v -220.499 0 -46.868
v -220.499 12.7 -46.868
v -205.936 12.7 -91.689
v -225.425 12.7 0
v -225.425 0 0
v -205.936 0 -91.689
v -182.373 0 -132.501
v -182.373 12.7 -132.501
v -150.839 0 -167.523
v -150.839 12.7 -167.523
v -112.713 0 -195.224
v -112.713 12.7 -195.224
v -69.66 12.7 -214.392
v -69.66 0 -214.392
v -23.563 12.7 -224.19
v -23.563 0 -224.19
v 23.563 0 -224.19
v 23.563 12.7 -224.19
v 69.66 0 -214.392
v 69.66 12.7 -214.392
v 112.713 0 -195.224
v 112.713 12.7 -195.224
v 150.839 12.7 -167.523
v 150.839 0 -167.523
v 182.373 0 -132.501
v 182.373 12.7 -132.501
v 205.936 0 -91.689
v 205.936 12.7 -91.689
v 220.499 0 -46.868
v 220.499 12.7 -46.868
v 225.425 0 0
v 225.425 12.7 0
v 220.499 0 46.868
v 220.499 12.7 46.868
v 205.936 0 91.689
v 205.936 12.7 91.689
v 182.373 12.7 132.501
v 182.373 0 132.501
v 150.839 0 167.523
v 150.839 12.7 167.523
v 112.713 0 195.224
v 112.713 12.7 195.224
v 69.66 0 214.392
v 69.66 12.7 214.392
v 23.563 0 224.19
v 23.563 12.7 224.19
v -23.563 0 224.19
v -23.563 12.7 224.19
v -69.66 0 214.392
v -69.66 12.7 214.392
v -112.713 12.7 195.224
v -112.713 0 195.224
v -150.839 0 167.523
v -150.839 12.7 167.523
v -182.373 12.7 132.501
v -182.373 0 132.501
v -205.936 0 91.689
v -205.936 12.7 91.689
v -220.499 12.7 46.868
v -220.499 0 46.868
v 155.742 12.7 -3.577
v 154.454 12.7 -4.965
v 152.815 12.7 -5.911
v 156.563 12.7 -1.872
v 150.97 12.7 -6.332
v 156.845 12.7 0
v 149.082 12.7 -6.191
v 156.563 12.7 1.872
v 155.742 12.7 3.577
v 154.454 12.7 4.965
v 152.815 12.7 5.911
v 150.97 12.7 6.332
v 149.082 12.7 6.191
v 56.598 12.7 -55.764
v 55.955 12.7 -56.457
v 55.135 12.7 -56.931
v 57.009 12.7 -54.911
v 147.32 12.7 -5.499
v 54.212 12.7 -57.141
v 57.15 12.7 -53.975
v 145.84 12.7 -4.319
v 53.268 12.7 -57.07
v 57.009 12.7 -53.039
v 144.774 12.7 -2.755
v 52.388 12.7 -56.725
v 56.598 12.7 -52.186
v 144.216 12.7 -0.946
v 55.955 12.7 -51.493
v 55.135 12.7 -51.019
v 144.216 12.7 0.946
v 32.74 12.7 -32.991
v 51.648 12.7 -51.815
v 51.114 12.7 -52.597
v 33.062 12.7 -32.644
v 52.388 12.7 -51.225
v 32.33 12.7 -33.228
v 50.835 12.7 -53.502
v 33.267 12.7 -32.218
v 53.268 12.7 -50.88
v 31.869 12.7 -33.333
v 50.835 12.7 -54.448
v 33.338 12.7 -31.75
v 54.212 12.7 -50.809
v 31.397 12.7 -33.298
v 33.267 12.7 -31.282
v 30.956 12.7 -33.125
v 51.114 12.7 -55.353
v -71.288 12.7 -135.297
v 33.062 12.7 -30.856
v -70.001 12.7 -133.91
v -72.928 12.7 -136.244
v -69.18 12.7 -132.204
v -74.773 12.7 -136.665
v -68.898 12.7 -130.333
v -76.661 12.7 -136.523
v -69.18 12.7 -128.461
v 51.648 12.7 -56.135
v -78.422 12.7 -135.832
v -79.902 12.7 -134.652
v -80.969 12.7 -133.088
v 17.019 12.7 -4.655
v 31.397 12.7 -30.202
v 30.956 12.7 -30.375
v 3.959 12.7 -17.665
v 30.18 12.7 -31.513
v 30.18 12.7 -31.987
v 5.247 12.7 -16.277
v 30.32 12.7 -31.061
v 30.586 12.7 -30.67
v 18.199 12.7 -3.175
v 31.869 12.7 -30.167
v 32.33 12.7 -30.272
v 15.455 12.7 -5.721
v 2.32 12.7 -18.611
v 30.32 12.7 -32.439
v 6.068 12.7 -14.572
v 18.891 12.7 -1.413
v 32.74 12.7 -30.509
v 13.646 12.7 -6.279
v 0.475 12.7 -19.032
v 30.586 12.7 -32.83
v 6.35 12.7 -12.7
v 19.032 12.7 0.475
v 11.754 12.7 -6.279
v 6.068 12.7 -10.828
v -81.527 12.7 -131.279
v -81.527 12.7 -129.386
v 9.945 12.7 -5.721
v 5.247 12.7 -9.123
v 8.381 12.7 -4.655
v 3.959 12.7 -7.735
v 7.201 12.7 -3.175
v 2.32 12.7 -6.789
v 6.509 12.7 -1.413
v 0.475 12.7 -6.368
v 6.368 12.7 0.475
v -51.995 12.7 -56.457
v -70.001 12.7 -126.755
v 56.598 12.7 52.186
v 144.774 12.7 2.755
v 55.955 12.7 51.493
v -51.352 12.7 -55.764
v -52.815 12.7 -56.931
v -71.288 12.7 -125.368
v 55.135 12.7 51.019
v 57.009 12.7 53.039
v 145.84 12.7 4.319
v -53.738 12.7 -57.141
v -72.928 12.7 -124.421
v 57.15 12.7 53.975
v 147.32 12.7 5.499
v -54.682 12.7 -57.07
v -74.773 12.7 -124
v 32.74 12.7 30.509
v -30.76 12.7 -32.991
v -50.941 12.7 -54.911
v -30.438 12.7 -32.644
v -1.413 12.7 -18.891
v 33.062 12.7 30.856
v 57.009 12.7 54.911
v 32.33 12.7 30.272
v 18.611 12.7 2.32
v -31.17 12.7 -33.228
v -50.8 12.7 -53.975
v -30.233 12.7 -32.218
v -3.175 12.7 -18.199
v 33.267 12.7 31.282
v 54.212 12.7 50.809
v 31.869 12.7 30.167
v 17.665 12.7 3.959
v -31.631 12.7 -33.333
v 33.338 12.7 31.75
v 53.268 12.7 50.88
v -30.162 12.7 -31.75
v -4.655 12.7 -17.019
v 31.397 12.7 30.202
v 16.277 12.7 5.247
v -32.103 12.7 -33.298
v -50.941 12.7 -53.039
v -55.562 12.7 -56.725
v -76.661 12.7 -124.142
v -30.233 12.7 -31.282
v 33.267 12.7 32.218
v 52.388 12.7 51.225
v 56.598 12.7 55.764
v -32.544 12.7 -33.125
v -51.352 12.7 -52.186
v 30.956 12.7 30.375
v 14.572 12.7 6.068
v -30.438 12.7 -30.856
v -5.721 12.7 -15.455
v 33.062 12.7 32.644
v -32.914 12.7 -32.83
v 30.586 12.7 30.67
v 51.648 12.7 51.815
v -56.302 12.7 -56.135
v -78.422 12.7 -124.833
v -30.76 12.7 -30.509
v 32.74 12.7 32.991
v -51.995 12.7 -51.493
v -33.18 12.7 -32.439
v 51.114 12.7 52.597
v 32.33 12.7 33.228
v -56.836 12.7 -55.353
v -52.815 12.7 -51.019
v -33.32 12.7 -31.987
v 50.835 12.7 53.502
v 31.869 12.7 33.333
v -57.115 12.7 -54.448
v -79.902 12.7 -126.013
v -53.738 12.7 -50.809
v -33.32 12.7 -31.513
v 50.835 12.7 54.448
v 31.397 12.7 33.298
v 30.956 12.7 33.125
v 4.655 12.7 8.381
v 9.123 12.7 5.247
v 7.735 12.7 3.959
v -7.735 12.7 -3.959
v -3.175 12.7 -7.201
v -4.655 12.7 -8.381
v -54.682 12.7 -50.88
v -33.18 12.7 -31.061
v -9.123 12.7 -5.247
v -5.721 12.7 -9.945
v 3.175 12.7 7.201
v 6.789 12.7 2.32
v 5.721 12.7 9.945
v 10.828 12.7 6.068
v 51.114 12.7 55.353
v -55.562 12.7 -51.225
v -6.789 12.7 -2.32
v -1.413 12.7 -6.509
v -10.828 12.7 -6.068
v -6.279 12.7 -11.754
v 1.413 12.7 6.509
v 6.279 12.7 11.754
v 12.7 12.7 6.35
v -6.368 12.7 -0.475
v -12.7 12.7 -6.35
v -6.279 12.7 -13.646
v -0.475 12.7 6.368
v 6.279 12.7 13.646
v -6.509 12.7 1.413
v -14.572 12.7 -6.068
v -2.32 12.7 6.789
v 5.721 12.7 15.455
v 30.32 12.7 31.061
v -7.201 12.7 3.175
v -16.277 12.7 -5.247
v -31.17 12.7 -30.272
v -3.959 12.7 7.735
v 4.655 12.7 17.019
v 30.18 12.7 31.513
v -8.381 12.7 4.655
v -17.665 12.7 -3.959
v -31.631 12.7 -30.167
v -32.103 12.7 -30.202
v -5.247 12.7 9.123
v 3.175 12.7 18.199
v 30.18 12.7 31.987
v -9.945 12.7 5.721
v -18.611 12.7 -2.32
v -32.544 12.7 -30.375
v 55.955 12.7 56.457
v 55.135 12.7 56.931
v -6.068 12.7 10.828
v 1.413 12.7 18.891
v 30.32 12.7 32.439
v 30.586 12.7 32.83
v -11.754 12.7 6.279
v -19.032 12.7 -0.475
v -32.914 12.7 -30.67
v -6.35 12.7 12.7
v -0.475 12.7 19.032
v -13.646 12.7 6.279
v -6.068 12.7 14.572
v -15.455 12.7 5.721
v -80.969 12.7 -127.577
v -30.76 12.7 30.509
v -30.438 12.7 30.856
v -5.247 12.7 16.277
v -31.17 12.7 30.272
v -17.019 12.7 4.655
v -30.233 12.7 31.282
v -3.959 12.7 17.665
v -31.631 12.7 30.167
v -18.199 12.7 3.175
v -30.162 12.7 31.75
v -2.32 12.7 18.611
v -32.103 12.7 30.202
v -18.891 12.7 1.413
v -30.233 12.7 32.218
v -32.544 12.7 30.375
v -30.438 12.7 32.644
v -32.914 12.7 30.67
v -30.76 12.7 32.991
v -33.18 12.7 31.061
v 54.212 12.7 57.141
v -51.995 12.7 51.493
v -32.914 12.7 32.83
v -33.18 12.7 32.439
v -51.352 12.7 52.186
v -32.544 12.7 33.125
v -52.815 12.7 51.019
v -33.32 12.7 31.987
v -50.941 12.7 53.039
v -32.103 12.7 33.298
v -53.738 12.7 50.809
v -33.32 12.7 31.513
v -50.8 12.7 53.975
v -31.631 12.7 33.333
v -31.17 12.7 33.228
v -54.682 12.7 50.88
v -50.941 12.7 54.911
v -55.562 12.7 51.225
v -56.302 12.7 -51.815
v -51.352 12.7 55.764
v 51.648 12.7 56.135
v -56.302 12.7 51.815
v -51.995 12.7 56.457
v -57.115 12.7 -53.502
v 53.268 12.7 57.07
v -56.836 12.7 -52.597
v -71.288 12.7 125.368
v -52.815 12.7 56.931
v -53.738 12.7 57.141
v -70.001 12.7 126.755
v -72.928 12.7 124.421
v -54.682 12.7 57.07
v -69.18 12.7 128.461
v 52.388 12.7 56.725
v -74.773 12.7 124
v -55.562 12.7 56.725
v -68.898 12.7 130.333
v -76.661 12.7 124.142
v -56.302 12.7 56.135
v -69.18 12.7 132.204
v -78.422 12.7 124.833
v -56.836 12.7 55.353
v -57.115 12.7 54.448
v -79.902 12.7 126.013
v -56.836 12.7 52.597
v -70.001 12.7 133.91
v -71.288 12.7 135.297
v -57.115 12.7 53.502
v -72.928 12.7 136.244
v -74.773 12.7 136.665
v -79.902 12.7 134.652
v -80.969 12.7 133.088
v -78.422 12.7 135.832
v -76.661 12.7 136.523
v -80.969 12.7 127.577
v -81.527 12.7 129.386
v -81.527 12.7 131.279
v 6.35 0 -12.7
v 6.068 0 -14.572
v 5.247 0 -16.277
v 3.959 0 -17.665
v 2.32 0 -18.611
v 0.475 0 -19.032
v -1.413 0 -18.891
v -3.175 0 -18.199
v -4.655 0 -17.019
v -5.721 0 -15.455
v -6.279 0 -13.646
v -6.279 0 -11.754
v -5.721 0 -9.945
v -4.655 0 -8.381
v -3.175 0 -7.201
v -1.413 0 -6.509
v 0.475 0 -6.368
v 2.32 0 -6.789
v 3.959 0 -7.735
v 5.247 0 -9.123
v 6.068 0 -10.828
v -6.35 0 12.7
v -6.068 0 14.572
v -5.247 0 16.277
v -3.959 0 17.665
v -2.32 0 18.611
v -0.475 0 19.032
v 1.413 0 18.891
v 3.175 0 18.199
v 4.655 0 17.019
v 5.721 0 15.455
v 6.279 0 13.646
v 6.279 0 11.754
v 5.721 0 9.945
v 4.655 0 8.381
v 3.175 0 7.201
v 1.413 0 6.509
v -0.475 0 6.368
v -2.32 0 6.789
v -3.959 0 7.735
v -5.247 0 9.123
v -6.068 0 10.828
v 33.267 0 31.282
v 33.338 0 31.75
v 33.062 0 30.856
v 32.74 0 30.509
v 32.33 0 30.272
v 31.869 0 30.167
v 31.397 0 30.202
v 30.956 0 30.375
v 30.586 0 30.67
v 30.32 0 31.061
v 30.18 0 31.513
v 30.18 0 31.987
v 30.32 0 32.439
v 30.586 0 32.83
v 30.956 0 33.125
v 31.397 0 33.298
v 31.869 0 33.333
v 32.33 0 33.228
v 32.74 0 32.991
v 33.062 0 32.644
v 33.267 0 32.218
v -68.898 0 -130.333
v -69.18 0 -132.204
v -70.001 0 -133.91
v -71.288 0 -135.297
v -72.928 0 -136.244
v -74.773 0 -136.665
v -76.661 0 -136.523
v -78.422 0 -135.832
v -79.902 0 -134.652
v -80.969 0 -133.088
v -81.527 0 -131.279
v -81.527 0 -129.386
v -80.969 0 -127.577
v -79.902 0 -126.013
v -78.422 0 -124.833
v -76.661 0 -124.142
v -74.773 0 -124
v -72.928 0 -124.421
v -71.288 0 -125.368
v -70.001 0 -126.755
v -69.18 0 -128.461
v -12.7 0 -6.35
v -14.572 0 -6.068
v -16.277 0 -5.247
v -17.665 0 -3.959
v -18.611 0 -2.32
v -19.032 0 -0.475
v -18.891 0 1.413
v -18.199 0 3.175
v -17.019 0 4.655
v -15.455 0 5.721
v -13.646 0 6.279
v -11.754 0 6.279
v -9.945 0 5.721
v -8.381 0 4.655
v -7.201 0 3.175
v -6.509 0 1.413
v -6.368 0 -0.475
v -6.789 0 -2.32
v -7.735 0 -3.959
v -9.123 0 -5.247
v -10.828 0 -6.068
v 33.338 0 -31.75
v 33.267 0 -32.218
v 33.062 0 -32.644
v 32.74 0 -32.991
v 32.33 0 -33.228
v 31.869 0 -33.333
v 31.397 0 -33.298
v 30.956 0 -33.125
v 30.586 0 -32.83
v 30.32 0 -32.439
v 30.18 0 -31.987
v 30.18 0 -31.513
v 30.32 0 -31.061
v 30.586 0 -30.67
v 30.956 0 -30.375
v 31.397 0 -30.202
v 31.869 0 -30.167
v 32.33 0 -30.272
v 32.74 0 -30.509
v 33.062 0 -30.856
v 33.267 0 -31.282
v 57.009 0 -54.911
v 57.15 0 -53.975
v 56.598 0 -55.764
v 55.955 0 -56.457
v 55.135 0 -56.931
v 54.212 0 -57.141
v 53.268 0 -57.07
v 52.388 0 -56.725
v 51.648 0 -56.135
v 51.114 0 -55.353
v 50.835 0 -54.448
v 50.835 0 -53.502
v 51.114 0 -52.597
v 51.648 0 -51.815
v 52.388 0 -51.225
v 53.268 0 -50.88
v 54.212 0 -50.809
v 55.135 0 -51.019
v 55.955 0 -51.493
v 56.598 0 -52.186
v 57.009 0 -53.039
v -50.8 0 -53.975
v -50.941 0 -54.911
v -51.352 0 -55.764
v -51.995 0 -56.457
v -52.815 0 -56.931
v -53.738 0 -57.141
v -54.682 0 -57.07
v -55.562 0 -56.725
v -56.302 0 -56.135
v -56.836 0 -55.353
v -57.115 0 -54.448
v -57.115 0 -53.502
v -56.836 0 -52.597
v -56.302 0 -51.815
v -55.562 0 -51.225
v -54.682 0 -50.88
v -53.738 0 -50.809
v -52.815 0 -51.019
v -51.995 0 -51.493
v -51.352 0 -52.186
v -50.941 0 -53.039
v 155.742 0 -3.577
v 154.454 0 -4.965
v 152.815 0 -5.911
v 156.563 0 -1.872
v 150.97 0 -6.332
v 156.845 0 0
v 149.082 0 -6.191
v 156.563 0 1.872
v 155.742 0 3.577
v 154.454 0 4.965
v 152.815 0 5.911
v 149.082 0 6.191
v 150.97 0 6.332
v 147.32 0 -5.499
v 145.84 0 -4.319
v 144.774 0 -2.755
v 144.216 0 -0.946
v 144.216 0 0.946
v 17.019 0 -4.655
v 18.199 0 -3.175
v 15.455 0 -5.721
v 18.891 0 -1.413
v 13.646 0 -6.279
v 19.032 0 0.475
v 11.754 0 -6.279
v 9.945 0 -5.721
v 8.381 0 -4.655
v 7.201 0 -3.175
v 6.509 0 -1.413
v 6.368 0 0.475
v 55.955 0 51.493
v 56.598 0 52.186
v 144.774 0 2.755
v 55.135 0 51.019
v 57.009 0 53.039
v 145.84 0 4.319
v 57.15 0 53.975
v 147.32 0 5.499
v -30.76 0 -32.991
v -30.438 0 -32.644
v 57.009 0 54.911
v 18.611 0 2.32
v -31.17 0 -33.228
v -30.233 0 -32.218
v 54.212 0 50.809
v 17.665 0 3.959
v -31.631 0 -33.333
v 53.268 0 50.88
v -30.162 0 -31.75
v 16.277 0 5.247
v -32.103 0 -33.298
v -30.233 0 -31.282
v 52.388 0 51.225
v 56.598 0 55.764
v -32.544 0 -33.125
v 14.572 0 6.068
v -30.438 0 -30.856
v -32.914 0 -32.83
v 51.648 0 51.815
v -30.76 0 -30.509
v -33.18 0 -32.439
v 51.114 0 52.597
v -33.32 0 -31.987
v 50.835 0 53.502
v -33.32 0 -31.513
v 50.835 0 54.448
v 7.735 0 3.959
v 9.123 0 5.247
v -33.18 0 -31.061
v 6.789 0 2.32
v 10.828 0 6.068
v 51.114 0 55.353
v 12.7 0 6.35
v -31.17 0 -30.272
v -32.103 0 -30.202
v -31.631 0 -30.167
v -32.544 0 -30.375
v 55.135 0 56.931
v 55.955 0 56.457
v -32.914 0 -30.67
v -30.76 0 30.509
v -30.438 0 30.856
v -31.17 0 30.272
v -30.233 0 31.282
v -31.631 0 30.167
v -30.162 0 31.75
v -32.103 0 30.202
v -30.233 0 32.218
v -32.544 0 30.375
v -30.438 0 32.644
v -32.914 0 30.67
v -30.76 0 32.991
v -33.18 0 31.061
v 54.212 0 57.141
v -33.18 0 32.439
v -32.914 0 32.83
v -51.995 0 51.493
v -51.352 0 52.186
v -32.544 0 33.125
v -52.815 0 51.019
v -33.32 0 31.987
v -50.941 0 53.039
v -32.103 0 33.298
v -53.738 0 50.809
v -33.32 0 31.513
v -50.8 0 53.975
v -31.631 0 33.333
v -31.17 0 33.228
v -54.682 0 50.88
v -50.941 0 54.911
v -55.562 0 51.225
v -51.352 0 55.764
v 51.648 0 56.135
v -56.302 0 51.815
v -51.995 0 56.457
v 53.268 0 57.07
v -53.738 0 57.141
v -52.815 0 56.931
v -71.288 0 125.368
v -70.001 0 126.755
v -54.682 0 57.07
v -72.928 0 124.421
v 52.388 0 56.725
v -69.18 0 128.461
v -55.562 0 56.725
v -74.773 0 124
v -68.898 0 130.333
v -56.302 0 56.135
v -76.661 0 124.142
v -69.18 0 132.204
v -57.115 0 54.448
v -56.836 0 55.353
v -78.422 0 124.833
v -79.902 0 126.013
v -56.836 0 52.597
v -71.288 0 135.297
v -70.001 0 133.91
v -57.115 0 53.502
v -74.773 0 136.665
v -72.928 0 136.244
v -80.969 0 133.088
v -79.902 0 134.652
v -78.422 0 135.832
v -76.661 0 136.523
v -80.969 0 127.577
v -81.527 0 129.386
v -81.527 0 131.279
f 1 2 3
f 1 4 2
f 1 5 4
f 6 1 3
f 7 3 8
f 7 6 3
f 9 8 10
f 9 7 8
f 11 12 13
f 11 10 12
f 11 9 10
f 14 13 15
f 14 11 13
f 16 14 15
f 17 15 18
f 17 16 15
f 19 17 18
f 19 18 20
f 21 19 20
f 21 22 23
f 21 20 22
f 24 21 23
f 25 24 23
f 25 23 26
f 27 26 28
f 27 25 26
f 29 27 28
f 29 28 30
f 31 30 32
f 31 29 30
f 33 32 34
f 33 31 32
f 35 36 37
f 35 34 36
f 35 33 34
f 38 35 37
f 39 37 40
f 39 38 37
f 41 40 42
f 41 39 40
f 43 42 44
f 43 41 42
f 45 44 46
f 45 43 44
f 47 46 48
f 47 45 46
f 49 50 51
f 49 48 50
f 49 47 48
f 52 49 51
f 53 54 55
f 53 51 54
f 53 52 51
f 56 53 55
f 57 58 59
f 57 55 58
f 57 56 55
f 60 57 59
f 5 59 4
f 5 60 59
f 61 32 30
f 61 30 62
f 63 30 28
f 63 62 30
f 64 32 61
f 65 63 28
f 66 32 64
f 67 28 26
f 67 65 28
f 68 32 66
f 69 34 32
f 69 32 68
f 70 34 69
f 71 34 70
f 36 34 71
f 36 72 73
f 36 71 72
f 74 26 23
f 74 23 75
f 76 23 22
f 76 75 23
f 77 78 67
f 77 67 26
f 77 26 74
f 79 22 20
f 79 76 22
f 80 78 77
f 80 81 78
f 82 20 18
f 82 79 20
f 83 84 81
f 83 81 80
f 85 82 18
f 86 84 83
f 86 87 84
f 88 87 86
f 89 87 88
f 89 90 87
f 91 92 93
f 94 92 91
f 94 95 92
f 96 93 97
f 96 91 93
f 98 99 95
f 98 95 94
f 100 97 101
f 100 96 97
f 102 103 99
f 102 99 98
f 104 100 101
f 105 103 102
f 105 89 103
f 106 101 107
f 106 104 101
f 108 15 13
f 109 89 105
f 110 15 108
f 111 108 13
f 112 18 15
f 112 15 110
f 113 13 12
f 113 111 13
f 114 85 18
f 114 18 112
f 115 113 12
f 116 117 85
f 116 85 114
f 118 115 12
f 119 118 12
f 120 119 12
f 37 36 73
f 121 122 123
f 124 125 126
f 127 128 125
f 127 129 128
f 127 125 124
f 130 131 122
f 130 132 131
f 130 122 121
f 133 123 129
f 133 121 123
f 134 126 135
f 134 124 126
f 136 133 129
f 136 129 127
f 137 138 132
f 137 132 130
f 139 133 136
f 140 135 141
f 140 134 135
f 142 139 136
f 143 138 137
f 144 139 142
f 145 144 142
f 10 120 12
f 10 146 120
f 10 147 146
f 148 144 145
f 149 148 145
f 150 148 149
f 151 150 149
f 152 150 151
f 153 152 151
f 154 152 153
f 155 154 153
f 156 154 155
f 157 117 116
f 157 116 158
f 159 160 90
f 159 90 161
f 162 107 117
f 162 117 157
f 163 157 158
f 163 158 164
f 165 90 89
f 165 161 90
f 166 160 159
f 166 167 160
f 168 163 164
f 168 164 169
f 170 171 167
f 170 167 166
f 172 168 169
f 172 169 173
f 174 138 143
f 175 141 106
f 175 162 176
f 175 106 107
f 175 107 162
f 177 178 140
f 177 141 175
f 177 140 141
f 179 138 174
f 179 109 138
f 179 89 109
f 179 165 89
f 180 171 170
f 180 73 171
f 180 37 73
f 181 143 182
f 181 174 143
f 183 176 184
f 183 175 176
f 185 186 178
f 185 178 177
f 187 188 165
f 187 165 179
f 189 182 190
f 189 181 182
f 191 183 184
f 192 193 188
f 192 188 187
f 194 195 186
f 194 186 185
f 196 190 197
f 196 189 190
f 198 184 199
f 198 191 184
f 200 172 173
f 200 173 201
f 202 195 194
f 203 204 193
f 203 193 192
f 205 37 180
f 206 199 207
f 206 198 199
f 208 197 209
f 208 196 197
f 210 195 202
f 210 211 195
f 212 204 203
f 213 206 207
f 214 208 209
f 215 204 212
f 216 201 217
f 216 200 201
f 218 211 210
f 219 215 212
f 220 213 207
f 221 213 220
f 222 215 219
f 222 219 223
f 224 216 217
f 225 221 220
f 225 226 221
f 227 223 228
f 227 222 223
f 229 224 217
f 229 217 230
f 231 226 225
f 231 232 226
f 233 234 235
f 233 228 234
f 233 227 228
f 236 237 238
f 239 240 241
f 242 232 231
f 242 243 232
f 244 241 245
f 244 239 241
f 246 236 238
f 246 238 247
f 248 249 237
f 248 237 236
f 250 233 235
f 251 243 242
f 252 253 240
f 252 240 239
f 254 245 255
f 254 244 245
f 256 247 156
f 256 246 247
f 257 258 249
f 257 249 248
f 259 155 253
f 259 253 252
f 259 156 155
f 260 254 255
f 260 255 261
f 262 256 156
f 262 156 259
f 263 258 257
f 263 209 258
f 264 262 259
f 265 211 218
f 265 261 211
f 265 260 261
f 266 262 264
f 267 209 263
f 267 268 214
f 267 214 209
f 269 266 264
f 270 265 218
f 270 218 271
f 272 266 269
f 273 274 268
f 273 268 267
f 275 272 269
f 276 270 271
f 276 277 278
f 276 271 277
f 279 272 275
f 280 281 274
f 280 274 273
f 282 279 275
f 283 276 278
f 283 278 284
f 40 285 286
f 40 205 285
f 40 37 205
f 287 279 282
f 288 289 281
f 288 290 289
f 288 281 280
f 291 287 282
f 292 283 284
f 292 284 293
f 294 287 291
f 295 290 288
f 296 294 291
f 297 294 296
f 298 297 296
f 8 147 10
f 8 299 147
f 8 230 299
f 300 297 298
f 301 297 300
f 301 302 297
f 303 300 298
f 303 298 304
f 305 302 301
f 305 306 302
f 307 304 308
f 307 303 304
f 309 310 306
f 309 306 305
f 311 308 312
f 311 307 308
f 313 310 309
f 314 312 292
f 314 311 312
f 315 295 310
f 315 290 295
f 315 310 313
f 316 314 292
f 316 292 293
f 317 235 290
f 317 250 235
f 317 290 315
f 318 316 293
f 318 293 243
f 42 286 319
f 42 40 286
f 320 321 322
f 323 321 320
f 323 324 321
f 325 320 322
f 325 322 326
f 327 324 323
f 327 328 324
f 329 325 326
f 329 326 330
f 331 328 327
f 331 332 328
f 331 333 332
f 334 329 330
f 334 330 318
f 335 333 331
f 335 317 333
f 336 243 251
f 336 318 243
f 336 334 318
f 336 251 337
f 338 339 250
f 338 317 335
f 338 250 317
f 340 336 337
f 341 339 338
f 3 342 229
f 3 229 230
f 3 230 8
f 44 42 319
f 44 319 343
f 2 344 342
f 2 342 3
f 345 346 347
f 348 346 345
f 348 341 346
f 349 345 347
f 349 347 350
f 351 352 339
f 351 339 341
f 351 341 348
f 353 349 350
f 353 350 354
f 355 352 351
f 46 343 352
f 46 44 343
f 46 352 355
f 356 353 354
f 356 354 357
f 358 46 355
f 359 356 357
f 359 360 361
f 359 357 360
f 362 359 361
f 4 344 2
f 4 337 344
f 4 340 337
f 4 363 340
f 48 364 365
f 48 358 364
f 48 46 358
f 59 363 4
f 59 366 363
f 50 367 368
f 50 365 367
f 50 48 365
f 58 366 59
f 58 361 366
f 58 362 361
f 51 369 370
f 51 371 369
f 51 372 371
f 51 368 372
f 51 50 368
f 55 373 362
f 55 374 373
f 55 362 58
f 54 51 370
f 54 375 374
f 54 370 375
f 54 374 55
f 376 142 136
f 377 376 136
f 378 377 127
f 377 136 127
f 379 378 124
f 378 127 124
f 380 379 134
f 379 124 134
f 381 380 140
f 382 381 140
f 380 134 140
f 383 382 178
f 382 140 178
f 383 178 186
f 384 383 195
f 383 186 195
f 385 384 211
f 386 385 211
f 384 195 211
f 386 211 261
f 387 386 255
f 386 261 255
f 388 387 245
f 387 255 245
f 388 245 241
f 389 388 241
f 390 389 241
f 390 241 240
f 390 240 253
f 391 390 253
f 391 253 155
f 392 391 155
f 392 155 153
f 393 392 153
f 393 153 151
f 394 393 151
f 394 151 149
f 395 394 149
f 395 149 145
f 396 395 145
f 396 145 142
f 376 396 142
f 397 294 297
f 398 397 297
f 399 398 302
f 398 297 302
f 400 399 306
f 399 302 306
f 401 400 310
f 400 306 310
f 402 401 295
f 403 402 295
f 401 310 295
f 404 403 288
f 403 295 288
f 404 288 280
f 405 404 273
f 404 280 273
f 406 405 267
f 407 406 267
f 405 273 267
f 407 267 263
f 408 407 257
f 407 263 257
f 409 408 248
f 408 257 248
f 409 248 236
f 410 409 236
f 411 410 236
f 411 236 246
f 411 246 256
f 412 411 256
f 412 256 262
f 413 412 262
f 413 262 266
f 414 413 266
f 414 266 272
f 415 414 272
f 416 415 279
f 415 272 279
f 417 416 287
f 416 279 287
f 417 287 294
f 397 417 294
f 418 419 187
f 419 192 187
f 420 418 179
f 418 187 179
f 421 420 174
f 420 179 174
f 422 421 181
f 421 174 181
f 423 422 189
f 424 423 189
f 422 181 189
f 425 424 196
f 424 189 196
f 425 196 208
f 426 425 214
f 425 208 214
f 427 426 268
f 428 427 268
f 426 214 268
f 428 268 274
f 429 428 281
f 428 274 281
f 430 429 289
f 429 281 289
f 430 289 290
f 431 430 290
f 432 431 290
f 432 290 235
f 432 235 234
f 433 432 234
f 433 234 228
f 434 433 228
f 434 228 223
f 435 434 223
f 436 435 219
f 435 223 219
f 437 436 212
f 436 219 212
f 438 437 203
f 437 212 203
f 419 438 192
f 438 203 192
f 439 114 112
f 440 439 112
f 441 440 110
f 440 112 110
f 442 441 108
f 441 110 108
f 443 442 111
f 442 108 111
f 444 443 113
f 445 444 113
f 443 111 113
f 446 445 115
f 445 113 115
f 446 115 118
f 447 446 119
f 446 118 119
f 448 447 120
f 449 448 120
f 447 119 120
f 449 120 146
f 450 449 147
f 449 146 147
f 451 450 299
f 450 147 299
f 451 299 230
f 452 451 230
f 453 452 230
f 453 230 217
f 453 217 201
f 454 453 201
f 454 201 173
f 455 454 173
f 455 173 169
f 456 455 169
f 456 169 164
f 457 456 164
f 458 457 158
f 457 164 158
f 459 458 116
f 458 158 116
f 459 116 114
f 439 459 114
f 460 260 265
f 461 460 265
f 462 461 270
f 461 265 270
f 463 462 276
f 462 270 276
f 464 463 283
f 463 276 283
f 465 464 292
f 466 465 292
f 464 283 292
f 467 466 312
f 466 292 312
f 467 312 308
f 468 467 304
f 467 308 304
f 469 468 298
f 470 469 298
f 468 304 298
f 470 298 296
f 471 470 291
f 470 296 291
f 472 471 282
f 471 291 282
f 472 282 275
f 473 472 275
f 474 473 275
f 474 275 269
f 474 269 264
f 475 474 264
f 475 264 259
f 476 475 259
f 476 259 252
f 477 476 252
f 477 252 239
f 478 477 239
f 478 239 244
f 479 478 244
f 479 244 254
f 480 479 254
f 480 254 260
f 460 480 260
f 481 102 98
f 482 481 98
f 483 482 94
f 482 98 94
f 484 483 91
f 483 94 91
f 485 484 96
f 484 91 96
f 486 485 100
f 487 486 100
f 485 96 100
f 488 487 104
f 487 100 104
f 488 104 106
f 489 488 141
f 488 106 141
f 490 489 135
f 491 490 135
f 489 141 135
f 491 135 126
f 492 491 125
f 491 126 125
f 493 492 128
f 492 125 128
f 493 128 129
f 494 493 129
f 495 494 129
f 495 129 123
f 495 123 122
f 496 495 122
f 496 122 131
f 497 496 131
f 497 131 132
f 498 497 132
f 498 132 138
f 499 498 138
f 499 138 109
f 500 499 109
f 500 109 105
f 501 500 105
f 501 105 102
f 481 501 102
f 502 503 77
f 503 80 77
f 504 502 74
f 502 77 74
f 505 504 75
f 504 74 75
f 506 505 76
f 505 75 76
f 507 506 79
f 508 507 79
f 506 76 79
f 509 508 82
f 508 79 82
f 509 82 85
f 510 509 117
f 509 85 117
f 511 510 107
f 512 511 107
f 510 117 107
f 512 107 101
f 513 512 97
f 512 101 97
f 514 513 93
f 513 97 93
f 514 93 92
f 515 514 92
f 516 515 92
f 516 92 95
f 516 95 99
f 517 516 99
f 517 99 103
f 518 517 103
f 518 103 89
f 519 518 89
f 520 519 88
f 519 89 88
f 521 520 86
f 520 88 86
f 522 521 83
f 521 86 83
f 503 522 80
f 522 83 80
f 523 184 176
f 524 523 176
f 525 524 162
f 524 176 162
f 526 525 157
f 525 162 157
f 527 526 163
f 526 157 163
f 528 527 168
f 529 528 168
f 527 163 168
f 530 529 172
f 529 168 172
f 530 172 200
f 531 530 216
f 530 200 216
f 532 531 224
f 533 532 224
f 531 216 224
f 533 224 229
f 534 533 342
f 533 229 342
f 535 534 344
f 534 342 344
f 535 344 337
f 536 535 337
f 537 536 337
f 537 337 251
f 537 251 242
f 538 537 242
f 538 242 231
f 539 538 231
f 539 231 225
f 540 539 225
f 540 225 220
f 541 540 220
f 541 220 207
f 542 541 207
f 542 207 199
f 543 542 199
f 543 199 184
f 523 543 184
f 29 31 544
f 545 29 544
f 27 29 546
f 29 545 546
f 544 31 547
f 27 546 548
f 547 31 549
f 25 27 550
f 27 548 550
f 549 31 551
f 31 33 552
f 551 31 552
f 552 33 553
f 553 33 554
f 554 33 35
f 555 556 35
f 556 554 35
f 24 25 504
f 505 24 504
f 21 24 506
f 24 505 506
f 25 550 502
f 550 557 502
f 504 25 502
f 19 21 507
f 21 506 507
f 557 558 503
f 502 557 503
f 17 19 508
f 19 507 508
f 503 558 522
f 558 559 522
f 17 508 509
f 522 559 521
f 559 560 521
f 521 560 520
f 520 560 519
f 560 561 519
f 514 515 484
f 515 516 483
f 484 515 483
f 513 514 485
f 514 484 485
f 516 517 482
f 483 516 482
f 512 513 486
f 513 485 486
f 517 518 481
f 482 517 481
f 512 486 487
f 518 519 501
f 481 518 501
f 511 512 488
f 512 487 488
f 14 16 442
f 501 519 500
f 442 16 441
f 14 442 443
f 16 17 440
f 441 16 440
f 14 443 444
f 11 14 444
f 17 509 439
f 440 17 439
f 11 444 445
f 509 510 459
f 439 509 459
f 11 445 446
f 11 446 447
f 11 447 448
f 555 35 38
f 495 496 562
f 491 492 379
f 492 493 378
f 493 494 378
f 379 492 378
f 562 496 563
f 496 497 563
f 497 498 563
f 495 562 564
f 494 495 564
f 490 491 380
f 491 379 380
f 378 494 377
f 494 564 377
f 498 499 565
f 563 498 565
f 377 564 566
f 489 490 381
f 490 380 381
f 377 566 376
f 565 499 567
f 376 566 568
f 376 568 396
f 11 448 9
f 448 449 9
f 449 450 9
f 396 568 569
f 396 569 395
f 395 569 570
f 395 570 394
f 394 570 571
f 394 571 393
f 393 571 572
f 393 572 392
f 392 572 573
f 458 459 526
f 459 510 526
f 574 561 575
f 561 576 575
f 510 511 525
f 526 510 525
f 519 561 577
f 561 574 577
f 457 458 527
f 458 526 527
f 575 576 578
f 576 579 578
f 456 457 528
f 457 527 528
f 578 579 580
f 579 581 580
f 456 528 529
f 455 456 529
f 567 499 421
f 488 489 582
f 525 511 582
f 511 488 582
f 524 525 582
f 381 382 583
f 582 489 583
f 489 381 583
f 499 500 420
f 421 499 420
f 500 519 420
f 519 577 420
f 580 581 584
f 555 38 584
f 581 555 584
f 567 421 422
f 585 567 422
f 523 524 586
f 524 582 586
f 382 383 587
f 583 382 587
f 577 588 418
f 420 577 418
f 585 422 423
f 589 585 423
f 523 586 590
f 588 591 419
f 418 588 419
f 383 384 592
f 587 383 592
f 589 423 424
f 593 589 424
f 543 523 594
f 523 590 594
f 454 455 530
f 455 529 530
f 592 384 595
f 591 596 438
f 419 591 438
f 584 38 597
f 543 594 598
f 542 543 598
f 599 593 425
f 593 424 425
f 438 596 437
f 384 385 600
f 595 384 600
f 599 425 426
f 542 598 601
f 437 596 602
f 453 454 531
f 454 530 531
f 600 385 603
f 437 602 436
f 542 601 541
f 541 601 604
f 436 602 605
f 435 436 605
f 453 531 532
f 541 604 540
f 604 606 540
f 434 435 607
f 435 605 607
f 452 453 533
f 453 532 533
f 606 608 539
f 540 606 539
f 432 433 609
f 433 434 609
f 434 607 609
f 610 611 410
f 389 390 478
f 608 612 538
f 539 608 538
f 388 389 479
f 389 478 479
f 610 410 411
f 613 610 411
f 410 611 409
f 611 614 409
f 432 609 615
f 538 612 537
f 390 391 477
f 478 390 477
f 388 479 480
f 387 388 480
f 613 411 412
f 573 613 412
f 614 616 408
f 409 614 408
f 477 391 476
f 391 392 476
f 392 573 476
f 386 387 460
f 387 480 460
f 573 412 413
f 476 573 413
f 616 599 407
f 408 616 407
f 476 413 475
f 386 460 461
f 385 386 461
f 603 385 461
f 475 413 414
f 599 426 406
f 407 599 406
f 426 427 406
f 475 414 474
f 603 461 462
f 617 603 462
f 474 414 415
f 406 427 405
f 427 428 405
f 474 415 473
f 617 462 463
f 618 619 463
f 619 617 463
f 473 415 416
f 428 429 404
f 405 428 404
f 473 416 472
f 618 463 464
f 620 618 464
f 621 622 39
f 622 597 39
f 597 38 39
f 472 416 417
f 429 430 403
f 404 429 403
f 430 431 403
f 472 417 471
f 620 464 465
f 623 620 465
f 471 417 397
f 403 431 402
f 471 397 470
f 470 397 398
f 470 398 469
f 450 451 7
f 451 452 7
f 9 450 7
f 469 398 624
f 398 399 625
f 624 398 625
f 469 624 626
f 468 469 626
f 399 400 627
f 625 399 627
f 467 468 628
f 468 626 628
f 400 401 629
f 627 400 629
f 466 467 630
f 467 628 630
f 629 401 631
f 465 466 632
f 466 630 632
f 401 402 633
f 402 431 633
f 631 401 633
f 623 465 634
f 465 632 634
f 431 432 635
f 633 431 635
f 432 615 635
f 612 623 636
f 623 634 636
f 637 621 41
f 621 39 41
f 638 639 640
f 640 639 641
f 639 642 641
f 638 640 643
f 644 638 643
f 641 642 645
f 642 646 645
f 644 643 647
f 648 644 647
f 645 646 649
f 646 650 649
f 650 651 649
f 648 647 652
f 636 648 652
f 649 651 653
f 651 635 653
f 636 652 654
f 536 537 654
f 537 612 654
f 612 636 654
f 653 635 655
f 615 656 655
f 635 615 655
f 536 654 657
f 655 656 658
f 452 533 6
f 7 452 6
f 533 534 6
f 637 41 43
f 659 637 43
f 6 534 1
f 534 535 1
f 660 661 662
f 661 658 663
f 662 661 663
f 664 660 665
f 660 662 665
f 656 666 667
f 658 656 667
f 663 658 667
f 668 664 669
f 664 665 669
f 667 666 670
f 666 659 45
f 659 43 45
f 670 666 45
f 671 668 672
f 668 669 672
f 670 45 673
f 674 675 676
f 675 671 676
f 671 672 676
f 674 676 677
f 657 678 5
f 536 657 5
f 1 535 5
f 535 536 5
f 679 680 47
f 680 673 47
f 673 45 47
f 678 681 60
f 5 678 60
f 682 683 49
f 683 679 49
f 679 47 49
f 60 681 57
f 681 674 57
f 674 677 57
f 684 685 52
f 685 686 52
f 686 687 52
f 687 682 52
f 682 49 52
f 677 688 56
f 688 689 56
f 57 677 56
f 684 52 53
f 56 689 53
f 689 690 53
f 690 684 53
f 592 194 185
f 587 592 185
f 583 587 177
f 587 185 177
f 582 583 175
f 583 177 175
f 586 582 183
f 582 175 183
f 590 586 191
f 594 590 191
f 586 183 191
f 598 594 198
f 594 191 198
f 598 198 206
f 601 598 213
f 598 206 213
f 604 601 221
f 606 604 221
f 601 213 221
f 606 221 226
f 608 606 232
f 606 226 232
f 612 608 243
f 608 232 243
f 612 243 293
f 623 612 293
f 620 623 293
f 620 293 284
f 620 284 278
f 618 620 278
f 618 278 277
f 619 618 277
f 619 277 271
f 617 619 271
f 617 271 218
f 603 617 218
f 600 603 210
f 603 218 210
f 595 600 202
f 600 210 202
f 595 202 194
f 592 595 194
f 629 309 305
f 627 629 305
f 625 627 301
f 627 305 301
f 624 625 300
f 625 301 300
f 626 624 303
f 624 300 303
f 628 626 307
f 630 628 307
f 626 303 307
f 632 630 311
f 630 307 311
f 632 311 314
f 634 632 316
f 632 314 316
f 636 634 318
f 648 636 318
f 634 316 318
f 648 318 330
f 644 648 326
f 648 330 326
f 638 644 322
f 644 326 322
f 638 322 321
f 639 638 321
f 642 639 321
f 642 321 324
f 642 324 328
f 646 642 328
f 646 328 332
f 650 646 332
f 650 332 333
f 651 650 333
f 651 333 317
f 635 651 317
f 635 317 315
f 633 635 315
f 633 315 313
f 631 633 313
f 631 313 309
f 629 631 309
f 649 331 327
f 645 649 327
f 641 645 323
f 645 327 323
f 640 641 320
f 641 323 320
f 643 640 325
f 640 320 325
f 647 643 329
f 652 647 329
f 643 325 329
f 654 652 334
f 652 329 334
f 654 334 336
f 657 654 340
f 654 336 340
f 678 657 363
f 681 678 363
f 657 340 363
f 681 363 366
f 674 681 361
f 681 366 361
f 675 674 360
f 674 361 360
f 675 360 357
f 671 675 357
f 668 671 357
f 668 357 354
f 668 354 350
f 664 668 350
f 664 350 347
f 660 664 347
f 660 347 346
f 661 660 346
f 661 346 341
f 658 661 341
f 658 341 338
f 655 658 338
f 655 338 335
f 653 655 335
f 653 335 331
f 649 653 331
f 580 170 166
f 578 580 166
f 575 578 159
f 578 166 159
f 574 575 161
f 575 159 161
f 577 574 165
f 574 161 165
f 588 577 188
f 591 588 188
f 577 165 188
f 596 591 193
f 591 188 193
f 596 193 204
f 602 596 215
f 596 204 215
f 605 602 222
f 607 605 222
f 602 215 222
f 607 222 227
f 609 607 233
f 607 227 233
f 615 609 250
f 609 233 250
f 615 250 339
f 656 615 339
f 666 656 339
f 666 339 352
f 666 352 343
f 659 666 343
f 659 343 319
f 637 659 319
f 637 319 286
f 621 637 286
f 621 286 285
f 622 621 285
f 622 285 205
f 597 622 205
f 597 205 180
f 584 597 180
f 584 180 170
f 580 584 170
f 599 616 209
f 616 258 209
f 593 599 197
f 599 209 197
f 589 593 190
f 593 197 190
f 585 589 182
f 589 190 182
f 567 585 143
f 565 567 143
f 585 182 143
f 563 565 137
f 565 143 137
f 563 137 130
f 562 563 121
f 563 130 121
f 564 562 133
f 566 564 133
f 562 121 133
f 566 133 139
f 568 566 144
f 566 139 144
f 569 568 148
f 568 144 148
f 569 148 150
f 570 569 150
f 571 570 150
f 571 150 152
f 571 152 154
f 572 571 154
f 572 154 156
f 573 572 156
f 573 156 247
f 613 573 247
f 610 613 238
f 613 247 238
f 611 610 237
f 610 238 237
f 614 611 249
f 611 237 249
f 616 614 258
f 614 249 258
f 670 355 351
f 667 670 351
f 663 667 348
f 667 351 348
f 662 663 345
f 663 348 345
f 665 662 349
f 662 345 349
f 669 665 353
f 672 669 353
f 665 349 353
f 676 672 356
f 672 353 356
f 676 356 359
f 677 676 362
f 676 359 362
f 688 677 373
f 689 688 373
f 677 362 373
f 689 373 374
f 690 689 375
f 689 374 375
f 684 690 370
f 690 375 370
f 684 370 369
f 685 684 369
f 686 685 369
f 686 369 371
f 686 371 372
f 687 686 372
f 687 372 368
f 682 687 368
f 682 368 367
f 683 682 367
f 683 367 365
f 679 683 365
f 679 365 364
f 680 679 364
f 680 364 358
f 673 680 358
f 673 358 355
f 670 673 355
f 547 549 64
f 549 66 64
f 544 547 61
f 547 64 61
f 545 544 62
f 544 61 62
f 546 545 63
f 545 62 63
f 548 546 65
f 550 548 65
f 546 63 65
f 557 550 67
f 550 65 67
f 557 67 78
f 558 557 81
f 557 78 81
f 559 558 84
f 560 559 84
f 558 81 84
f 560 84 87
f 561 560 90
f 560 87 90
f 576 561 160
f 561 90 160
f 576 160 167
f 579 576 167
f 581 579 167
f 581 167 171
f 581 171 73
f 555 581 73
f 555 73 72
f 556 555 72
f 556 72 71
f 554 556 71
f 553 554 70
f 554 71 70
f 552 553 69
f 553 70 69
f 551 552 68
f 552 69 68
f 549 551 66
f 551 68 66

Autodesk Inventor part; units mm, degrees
ref_plane "YZ Plane" through (0, 0, 0) normal (1, 0, 0) x (0, 1, 0)
ref_plane "XZ Plane" through (0, 0, 0) normal (0, 1, 0) x (-1, 0, 0)
ref_plane "XY Plane" through (0, 0, 0) normal (0, 0, 1) x (1, 0, 0)
sketch "Sketch1" plane through (0, 0, 0) normal (0, 1, 0) x (-1, 0, 0)
  circle A0 centre (0, 0) radius 225.425
  dimension "d0" = 450.85
extrude "Extrusion1" add sketch "Sketch1" along normal blind 12.7
sketch "Sketch2" plane through (0, 12.7, 0) normal (0, 1, 0) x (1, 0, 0)
  circle A0 centre (0, 0) radius 225.425 projected
  circle A1 centre (0, 12.7) radius 6.35
  dimension "d3" = 12.7
  dimension "d4" = 12.7
extrude "Extrusion2" cut sketch "Sketch2" against normal blind 12.7 contours A1
pattern_circular "Circular Pattern1" count 4 over 360 about axis through (0, -10, 0) along (0, 1, 0) of "Extrusion2"
sketch "Sketch3" plane through (0, 12.7, 0) normal (0, 1, 0) x (1, 0, 0)
  circle A0 centre (0, 0) radius 225.425 projected
  line L0 (-38.1, 38.1) -> (38.1, 38.1)
  line L1 (38.1, 38.1) -> (38.1, -38.1)
  line L2 (38.1, -38.1) -> (-38.1, -38.1)
  line L3 (-38.1, -38.1) -> (-38.1, 38.1)
  circle A1 centre (-31.75, 31.75) radius 1.5875
  circle A2 centre (31.75, 31.75) radius 1.5875
  circle A3 centre (-31.75, -31.75) radius 1.5875
  circle A4 centre (31.75, -31.75) radius 1.5875
  line L4 (-63.5, 63.5) -> (63.5, 63.5)
  line L5 (63.5, 63.5) -> (63.5, -63.5)
  line L6 (63.5, -63.5) -> (-63.5, -63.5)
  line L7 (-63.5, -63.5) -> (-63.5, 63.5)
  circle A5 centre (53.975, 53.975) radius 3.175
  circle A6 centre (-53.975, 53.975) radius 3.175
  circle A7 centre (53.975, -53.975) radius 3.175
  circle A8 centre (-53.975, -53.975) radius 3.175
  circle A9 centre (150.495, 0) radius 6.35
  circle A10 centre (-75.2475, 130.3325) radius 6.35
  circle A11 centre (-75.2475, -130.3325) radius 6.35
  dimension "d10" = 76.2
  dimension "d11" = 76.2
  dimension "d12" = 38.1
  dimension "d13" = 38.1
  dimension "d14" = 3.175
  dimension "d15" = 6.35
  dimension "d16" = 6.35
  dimension "d19" = 63.5
  dimension "d22" = 63.5
  dimension "d27" = 127
  dimension "d28" = 127
  dimension "d29" = 63.5
  dimension "d30" = 63.5
  dimension "d31" = 6.35
  dimension "d32" = 9.525
  dimension "d33" = 9.525
  dimension "d36" = 107.95
  dimension "d39" = 107.95
  dimension "d42" = 12.7
  dimension "d43" = 150.495
  dimension "d46" = 360
extrude "Extrusion3" cut sketch "Sketch3" against normal blind 12.7 contours A1 | A2 | A3 | A4 | A5 | A6 | A7 | A8 | A9 | A10 | A11
properties part number "Base_Can"
